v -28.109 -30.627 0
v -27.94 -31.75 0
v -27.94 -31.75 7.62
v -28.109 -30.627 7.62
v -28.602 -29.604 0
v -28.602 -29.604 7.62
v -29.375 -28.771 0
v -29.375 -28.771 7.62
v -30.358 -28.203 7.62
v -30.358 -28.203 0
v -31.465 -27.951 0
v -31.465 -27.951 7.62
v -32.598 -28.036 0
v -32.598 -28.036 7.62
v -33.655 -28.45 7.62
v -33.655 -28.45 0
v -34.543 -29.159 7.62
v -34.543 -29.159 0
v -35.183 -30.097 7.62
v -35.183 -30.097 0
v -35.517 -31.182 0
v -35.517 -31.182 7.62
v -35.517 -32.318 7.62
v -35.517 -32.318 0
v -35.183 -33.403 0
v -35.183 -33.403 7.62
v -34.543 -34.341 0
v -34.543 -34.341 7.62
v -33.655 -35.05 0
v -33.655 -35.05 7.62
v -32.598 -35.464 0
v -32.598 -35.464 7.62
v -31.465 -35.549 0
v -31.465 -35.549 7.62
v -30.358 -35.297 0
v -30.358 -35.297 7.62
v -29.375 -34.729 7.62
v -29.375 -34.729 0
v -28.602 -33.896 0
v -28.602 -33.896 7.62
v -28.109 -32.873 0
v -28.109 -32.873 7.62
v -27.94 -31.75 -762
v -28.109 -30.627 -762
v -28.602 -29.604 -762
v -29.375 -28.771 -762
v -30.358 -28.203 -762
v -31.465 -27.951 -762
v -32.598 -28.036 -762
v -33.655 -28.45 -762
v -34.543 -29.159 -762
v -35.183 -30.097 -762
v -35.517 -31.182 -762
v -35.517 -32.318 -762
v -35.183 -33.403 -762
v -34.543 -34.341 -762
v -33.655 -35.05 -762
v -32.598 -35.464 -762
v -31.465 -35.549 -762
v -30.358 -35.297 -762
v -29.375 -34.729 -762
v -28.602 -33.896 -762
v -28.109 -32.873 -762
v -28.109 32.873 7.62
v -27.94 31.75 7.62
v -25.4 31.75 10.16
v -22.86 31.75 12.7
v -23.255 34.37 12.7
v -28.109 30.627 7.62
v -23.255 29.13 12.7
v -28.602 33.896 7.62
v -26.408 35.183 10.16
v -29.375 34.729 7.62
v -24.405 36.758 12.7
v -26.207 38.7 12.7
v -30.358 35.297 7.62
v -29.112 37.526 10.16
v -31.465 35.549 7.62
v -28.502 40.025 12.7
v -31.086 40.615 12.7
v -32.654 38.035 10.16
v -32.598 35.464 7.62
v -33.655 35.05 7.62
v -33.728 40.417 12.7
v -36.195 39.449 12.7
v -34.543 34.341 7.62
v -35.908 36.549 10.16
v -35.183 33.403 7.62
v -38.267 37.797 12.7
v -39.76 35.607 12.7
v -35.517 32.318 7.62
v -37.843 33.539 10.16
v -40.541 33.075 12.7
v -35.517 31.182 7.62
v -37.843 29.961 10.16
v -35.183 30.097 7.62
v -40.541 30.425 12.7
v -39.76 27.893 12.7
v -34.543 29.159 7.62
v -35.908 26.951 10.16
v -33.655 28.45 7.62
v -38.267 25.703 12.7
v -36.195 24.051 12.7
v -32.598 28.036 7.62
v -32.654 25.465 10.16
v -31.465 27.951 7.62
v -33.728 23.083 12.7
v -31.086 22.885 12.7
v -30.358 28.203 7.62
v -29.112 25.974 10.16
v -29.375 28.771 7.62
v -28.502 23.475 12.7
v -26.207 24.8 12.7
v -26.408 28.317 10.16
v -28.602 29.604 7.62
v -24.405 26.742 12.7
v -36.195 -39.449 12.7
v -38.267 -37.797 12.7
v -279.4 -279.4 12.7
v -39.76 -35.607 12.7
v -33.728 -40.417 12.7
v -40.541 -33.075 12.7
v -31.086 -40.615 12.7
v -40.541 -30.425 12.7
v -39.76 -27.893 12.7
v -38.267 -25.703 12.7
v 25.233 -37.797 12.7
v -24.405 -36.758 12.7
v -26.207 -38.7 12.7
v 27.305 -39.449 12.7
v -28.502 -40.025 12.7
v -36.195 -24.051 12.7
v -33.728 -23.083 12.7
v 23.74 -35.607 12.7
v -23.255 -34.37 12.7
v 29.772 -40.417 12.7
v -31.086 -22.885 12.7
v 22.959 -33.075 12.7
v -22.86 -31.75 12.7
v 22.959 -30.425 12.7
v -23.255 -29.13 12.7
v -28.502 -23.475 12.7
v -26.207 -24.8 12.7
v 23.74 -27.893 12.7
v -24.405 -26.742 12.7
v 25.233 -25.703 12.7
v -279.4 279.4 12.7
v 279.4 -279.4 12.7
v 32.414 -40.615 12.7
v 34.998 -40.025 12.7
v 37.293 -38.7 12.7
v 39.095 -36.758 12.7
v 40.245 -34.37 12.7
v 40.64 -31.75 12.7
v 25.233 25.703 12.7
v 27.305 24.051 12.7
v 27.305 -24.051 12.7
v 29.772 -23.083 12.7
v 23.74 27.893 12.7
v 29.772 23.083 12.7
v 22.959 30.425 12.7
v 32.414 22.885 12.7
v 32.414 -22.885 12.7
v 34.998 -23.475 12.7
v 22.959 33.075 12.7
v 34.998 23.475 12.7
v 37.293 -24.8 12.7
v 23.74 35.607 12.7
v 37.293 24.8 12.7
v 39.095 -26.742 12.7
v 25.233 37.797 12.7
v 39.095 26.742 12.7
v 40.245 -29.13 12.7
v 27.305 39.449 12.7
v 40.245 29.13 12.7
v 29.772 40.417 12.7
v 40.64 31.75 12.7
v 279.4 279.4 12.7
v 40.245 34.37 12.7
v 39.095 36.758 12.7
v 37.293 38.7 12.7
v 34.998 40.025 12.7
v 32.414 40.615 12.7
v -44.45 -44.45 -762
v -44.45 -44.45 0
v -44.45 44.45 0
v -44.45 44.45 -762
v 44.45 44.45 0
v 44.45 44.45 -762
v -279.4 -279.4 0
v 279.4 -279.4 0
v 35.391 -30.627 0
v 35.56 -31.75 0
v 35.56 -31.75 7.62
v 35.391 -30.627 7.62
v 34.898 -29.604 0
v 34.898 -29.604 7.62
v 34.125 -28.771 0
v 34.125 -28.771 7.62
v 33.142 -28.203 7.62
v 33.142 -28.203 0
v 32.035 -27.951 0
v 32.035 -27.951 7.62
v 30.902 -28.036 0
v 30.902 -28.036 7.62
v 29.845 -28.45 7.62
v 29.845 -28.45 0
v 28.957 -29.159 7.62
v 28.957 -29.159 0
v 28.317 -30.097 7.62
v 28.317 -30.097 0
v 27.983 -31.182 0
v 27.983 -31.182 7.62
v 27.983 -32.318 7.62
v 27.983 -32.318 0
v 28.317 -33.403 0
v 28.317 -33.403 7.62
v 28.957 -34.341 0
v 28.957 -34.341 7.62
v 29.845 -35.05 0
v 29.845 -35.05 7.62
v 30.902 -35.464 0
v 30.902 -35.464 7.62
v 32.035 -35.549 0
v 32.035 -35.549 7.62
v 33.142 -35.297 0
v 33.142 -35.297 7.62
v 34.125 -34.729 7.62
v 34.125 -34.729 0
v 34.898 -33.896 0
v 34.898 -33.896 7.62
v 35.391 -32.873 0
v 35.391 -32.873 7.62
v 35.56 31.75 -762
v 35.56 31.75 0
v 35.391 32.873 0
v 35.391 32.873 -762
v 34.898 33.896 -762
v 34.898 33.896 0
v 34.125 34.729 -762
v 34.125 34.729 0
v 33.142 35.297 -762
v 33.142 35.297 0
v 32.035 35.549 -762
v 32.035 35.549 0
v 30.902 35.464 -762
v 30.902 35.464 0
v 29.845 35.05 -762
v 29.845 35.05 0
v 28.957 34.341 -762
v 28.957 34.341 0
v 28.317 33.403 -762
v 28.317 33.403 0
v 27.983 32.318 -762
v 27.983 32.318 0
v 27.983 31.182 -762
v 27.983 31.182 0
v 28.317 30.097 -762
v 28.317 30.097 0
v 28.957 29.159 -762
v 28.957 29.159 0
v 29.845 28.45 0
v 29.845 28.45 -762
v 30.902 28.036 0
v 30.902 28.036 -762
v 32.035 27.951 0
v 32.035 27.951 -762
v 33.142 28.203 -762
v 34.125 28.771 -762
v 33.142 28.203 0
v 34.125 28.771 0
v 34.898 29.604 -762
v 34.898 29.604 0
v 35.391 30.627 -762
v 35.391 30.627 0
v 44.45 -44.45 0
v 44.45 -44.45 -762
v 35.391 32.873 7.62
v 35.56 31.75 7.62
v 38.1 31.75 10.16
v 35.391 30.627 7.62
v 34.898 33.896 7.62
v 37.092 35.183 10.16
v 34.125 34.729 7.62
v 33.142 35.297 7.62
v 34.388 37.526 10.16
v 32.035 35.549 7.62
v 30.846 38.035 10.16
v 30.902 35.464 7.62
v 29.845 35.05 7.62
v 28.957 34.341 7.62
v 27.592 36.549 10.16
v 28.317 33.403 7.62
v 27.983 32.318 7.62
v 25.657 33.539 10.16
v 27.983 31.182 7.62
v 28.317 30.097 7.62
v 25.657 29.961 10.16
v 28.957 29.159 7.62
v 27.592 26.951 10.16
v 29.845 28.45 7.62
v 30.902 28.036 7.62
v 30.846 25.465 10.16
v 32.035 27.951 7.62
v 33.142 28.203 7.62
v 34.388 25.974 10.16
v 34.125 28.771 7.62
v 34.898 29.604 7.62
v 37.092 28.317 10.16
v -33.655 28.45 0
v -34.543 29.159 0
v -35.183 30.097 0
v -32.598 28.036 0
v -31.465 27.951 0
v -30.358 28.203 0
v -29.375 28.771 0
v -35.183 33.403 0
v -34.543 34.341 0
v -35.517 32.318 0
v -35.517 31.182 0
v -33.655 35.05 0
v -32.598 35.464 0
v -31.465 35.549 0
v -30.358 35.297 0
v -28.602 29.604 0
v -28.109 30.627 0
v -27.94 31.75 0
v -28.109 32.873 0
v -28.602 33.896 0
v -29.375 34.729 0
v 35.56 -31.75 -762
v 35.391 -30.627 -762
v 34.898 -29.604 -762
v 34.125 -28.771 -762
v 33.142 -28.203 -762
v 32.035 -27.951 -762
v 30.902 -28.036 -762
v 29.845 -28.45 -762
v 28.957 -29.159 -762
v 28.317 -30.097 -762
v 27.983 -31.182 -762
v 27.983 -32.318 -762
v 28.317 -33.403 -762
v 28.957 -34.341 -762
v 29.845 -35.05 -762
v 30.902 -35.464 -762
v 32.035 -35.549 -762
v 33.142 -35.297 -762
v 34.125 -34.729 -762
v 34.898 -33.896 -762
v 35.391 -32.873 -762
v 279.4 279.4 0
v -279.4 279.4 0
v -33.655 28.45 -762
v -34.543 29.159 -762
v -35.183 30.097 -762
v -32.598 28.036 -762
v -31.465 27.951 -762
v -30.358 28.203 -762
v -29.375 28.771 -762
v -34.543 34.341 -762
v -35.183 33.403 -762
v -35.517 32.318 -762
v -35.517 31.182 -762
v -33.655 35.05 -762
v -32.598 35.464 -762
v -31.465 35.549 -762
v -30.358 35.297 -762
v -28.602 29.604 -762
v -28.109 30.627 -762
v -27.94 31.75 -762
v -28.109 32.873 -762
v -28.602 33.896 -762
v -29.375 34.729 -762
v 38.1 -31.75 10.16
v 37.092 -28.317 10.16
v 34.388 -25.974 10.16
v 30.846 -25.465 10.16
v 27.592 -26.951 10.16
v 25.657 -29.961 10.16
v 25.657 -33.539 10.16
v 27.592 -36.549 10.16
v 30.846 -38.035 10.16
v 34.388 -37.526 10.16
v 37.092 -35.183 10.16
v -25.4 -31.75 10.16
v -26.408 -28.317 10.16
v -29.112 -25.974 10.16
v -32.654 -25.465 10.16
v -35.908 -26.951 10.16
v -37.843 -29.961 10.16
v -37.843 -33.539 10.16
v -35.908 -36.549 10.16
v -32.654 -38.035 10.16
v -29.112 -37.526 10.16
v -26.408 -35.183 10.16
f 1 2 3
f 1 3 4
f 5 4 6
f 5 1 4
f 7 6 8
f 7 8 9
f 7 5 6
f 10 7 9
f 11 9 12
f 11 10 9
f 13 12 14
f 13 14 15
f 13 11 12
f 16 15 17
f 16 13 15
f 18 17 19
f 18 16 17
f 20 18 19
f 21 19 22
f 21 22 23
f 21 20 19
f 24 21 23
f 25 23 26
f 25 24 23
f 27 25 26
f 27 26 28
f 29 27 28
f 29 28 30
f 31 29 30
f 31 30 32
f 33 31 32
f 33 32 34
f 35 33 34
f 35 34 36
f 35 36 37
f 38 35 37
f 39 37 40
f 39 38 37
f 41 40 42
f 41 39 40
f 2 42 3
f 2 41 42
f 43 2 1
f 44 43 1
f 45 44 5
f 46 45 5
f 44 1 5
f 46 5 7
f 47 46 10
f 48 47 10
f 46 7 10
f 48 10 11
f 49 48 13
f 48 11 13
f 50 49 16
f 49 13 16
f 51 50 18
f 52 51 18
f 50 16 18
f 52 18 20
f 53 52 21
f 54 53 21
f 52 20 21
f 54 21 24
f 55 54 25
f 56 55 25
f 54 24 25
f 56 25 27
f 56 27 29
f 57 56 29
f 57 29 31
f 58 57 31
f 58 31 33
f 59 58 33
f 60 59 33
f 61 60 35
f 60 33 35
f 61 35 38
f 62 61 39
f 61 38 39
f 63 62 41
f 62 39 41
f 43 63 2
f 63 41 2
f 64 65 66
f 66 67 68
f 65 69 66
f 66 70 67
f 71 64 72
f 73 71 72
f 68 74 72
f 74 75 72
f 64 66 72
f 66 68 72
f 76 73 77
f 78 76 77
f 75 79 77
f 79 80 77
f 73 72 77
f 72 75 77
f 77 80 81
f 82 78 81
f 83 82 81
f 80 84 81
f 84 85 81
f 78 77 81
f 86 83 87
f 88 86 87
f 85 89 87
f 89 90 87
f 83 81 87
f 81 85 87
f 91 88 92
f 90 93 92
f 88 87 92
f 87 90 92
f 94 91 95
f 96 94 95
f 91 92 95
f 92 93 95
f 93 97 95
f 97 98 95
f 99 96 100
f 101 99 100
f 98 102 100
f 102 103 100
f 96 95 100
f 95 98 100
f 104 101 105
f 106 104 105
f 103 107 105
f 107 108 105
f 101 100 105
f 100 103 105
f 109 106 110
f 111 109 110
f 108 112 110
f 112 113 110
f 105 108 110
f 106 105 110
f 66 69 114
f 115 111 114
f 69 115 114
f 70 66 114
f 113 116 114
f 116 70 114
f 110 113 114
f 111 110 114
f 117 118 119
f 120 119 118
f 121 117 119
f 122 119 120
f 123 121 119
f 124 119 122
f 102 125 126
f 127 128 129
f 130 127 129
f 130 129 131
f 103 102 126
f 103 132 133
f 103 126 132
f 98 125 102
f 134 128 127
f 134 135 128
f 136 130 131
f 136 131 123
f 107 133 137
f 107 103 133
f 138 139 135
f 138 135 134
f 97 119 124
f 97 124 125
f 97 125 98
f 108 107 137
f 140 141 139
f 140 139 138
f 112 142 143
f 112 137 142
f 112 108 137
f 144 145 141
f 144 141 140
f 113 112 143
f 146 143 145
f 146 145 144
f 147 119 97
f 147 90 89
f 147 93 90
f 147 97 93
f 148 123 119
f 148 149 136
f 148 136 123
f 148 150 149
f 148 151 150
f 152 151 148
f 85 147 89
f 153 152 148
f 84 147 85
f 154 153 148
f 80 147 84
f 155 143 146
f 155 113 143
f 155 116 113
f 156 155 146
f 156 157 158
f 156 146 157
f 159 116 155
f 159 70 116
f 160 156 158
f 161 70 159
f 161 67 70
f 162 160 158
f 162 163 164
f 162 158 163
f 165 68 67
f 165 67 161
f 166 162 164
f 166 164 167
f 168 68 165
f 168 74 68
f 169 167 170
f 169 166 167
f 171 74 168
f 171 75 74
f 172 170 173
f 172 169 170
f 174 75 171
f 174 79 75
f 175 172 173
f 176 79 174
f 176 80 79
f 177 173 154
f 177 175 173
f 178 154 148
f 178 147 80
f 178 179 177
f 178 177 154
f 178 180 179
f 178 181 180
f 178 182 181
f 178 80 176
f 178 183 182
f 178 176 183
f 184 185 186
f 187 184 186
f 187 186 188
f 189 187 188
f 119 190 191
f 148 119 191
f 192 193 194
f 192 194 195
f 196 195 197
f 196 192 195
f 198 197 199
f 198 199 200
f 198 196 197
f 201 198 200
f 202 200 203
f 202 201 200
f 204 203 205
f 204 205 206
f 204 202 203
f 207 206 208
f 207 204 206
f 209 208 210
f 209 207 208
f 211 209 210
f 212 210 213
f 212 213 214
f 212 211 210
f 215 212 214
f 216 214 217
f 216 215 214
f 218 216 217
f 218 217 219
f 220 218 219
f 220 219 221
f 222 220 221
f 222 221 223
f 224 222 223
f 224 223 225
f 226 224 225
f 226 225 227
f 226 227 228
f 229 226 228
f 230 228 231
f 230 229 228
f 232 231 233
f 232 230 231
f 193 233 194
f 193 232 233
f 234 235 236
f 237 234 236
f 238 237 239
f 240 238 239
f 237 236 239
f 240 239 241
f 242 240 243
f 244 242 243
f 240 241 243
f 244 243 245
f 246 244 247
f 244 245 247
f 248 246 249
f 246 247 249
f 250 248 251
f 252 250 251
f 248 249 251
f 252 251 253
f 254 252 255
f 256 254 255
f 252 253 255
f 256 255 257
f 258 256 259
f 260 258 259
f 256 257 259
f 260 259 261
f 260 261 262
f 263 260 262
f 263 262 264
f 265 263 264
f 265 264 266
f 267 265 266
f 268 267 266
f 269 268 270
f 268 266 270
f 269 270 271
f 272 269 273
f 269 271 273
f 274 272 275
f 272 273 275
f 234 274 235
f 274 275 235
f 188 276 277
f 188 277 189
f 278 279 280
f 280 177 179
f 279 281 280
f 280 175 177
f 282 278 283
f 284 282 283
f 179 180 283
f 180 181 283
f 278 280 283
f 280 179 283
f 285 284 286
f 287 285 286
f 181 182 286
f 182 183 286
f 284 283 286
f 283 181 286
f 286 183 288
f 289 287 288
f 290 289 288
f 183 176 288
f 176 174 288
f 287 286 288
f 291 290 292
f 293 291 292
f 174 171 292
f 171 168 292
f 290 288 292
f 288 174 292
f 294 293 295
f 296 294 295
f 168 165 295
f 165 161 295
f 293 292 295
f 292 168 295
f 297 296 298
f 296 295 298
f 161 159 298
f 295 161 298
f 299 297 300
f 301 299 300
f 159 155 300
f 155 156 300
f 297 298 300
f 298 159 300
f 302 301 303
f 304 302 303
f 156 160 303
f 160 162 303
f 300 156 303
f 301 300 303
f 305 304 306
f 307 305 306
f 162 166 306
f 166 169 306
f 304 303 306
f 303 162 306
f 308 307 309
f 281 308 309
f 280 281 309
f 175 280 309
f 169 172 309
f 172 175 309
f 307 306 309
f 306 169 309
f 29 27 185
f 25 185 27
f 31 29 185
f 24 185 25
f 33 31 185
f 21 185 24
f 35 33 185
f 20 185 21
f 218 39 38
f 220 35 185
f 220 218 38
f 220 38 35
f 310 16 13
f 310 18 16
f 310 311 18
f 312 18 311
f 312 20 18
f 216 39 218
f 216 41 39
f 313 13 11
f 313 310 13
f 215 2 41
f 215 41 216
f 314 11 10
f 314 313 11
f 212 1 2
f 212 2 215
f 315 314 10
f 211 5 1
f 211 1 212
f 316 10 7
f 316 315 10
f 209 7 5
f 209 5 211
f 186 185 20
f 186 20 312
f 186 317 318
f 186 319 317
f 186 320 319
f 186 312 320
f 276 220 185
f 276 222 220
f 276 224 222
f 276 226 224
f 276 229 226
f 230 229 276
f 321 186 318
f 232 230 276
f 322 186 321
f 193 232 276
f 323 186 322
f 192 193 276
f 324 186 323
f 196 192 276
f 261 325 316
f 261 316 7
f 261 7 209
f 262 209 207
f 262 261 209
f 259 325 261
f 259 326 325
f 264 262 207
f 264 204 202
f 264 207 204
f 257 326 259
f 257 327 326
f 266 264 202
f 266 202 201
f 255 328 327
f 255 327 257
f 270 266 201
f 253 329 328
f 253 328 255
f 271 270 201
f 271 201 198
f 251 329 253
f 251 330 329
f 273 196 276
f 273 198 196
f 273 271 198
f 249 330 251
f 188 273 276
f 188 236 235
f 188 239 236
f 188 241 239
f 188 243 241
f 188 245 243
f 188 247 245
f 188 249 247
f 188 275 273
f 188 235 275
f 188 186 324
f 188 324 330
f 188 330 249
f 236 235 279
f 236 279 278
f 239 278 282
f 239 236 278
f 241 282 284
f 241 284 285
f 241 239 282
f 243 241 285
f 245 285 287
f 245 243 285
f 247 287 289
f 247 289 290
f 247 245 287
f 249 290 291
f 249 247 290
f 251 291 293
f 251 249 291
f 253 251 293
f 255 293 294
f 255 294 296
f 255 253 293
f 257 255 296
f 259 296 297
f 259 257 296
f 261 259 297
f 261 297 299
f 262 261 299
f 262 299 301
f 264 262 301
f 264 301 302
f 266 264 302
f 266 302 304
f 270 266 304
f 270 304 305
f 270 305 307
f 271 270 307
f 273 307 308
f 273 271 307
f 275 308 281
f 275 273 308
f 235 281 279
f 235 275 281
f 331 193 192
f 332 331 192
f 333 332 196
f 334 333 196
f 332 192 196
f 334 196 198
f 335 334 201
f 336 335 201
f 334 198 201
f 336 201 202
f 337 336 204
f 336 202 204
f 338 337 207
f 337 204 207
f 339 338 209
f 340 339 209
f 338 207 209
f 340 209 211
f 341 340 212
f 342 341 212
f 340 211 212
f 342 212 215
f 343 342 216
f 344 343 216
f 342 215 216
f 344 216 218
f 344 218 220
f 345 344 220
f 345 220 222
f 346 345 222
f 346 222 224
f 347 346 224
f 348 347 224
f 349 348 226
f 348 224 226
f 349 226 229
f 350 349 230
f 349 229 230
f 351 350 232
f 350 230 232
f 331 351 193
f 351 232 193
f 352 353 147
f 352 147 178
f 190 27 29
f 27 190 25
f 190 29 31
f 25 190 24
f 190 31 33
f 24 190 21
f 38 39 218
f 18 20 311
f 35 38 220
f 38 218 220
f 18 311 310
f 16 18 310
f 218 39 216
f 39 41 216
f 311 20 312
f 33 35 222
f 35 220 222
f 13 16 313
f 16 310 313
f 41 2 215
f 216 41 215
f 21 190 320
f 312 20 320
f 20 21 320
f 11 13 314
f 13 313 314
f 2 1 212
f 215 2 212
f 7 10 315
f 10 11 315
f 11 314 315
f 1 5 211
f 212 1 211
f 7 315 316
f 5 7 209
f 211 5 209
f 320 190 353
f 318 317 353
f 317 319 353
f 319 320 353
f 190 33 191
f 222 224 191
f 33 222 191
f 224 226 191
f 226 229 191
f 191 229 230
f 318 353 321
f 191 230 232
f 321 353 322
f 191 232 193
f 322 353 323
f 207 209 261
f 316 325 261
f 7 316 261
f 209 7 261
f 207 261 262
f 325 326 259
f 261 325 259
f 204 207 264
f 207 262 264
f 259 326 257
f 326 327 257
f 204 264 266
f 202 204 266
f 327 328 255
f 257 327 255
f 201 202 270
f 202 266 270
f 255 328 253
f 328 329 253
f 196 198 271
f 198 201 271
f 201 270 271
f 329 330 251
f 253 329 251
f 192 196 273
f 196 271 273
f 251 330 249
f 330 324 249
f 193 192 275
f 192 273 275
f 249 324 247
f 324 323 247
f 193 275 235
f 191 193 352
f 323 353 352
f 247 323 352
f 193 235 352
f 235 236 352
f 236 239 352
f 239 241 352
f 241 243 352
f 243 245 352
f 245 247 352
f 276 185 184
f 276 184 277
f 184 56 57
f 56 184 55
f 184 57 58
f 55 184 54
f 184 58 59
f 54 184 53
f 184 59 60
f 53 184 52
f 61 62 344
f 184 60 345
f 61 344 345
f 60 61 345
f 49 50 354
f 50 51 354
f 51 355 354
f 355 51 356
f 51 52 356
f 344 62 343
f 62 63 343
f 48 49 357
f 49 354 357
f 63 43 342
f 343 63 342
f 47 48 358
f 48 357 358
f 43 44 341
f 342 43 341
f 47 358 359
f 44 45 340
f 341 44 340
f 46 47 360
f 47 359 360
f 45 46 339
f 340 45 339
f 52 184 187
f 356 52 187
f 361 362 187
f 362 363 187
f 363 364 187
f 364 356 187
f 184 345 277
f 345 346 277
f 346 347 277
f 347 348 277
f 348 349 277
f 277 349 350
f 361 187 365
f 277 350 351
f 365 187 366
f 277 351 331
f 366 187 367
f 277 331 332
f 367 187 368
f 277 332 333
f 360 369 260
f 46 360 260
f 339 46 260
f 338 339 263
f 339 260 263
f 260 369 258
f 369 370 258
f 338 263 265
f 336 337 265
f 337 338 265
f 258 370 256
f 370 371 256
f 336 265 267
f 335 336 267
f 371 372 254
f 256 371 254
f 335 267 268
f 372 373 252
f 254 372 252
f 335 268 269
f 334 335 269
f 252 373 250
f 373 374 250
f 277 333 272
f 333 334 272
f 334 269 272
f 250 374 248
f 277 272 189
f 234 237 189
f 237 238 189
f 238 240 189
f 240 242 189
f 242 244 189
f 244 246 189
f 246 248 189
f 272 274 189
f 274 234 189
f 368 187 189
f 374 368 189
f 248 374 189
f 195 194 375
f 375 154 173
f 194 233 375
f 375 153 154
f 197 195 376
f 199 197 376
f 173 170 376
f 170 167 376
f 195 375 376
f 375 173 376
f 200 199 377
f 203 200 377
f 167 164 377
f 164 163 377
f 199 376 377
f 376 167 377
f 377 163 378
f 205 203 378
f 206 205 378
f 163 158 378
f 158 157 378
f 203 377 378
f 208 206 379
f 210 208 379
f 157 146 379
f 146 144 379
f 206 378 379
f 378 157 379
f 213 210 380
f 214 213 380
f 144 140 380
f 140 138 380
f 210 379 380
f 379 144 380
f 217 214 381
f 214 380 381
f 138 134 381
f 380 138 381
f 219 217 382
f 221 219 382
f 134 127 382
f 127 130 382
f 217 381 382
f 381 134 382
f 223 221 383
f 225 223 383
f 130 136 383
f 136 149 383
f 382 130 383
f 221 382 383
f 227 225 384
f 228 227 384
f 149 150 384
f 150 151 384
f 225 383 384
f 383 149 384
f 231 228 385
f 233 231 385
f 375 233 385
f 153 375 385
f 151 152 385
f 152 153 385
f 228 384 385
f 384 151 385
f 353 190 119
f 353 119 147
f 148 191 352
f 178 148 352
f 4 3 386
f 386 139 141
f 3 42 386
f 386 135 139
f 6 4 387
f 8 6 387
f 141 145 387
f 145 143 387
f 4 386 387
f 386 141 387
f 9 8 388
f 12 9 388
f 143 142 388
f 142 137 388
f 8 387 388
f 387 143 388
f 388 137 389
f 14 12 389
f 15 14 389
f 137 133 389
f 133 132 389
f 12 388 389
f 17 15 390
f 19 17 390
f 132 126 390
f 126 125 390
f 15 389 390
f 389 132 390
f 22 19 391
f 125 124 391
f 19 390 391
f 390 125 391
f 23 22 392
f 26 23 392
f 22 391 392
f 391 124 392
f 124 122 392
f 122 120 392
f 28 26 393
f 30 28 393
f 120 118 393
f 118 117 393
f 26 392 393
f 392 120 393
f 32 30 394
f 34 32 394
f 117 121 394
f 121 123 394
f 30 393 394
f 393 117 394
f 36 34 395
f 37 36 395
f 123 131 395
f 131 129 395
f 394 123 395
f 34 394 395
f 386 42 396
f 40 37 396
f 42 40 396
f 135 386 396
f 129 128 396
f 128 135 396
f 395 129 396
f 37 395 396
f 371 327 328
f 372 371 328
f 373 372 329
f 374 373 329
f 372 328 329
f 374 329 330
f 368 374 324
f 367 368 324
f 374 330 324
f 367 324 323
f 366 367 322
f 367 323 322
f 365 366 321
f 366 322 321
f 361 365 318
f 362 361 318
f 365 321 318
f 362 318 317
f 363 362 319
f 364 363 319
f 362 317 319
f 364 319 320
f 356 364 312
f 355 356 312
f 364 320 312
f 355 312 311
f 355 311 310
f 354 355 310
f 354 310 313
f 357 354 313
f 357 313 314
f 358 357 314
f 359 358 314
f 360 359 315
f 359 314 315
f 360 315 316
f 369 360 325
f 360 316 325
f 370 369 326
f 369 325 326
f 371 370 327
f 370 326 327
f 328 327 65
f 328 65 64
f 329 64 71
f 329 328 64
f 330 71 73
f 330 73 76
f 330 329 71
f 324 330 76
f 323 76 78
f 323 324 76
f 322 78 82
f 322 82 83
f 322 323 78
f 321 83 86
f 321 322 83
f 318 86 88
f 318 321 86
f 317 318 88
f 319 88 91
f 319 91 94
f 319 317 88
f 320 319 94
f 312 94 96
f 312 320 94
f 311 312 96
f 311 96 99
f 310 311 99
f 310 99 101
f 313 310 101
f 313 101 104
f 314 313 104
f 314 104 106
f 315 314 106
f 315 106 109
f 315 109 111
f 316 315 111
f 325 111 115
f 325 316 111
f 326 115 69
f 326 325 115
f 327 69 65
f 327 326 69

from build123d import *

# Parameters (mm, degrees)
F0_W     = 558.8
F0_H     = 558.8
F0_W_2   = 88.9
F0_H_2   = 88.9
F0_R     = 3.81
F1_DEPTH = 12.7
F2_SIZE  = 5.08
F3_DEPTH = 762


with BuildPart() as f1:
    # F0 (on Top) → F1 (new body)
    with BuildSketch(Plane.XY):
        Rectangle(F0_W, F0_H)
        Rectangle(F0_W_2, F0_H_2, mode=Mode.SUBTRACT)
        Rectangle(F0_W_2, F0_H_2)
        with Locations((-31.75, -31.75)):
            Circle(F0_R, mode=Mode.SUBTRACT)
        with Locations((31.75, -31.75)):
            Circle(F0_R, mode=Mode.SUBTRACT)
        with Locations((-31.75, 31.75)):
            Circle(F0_R, mode=Mode.SUBTRACT)
        with Locations((31.75, 31.75)):
            Circle(F0_R, mode=Mode.SUBTRACT)
    extrude(amount=F1_DEPTH)

    # F2
    f2_edges = [f1.edges().sort_by_distance(p)[0] for p in [
        (-35.56, -31.75, 12.7),
        (27.94, -31.75, 12.7),
        (27.94, 31.75, 12.7),
        (-35.56, 31.75, 12.7),
    ]]
    chamfer(f2_edges, length=F2_SIZE)


with BuildPart() as f3:
    # F0 (on Top) → F3 (new body)
    with BuildSketch(Plane.XY):
        Rectangle(F0_W_2, F0_H_2)
        with Locations((-31.75, -31.75)):
            Circle(F0_R, mode=Mode.SUBTRACT)
        with Locations((31.75, -31.75)):
            Circle(F0_R, mode=Mode.SUBTRACT)
        with Locations((-31.75, 31.75)):
            Circle(F0_R, mode=Mode.SUBTRACT)
        with Locations((31.75, 31.75)):
            Circle(F0_R, mode=Mode.SUBTRACT)
    extrude(amount=-F3_DEPTH)


solid = Compound([f1.part, f3.part])
